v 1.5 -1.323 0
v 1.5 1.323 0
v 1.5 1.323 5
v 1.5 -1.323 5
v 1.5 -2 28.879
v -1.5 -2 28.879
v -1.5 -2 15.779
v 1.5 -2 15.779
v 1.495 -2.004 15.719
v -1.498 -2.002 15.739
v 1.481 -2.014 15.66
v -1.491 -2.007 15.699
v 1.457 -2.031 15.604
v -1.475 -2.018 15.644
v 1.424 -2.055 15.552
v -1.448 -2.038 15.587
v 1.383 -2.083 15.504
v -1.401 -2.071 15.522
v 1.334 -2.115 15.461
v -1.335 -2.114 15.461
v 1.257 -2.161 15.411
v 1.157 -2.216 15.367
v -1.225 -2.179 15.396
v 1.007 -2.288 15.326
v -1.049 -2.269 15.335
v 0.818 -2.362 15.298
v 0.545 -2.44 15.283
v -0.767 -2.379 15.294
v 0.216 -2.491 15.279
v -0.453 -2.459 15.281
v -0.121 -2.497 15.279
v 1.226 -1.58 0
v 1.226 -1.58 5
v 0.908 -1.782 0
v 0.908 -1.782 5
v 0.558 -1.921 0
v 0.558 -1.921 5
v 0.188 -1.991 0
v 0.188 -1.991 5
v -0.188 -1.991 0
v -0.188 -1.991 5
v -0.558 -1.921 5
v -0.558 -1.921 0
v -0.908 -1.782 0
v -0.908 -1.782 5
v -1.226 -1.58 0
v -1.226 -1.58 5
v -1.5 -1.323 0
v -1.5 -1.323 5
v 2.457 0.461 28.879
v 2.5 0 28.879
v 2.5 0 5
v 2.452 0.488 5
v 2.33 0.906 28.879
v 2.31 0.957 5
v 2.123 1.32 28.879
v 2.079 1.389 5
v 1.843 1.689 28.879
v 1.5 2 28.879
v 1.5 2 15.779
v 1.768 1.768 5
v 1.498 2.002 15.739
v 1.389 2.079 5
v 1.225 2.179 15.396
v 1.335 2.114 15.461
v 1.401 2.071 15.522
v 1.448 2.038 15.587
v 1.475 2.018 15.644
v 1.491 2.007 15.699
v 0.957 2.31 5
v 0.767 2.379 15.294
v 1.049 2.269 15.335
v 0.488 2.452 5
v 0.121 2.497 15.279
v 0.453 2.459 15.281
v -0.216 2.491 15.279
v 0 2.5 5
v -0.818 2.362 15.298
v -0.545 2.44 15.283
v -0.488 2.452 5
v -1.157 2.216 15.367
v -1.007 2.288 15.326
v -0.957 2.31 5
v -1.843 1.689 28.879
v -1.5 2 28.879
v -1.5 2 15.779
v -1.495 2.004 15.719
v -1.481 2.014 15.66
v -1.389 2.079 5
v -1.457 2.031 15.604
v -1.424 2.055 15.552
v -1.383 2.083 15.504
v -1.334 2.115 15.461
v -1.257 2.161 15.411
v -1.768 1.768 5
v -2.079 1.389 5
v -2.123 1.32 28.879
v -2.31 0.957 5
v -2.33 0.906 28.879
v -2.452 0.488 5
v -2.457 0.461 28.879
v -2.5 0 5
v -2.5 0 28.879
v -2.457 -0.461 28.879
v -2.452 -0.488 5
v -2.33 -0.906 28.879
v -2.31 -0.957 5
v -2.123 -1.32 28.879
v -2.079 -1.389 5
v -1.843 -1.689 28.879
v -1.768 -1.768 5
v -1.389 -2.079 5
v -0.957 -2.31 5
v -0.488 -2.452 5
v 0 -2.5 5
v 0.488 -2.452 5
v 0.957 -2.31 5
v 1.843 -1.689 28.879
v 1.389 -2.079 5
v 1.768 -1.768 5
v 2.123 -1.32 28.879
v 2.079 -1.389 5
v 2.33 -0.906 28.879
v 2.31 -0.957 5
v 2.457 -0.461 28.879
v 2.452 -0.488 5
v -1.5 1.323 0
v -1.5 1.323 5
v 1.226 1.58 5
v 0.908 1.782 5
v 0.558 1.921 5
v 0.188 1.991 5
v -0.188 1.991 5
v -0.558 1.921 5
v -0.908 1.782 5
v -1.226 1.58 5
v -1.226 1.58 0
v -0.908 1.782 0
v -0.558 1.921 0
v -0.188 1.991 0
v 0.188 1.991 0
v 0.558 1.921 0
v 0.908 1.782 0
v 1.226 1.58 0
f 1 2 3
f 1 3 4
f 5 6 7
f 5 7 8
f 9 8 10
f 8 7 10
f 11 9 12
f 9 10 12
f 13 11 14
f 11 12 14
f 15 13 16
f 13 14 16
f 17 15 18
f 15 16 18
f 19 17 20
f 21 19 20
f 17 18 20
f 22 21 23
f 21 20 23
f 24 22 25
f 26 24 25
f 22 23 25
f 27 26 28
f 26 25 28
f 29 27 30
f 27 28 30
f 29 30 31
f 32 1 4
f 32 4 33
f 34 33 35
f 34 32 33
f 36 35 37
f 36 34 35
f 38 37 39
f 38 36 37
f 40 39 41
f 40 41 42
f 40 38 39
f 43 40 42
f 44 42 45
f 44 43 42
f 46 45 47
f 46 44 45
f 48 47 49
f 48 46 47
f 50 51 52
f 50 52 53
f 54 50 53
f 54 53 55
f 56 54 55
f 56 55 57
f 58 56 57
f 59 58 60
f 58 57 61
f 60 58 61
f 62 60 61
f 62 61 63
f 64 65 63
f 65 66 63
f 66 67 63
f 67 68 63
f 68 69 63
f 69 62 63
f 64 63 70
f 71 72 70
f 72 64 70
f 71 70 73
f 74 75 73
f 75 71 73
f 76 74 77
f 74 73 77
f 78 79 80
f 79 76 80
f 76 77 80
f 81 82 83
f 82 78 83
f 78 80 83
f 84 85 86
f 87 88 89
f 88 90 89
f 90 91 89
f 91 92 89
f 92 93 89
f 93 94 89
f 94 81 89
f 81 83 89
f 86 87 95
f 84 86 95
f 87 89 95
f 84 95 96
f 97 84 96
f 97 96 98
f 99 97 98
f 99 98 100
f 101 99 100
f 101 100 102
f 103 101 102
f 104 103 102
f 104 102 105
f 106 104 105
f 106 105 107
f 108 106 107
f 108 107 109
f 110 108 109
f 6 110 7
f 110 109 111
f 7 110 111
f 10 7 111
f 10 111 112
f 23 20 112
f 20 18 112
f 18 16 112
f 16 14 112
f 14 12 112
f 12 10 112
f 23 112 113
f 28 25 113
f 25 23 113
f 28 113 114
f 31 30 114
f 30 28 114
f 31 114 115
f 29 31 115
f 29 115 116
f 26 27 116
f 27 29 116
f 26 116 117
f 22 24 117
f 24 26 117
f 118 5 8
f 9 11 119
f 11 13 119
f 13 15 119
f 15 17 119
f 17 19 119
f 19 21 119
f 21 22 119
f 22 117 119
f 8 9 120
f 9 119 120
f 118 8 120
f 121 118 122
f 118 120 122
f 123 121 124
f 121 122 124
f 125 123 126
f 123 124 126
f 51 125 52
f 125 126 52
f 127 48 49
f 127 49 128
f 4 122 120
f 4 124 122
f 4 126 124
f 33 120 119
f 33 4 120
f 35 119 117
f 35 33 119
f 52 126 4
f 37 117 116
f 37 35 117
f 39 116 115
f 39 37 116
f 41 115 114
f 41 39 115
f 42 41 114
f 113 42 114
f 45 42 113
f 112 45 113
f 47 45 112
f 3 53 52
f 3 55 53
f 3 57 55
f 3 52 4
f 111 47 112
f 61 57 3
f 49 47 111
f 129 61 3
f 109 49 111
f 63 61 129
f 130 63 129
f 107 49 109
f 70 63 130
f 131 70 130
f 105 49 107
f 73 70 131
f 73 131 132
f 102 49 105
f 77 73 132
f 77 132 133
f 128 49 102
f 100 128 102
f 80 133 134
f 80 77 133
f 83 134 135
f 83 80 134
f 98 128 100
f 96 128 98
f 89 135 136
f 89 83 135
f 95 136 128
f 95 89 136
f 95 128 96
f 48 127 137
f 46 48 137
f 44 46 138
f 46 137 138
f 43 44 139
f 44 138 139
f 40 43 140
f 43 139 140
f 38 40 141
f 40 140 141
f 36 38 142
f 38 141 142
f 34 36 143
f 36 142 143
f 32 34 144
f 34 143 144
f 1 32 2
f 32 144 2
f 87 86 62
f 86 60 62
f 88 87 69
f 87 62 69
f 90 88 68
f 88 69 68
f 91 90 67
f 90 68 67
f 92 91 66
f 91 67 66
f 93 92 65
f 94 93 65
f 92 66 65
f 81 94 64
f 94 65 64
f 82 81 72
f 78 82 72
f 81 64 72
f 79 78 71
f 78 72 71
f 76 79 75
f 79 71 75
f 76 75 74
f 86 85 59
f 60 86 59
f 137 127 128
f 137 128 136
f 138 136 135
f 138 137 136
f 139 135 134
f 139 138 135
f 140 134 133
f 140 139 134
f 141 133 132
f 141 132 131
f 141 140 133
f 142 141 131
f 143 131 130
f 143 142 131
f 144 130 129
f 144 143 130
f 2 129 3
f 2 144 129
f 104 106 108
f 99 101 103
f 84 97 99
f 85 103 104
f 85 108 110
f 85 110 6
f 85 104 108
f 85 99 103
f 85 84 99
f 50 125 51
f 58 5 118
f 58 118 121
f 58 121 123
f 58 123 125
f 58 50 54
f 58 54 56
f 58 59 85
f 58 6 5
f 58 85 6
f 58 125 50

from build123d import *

# Parameters (mm, degrees)
SKETCH1_R               = 2.5
BOSS_EXTRUDE1_DEPTH     = 28.879
SKETCH2_R               = 2.5
CUT_EXTRUDE1_DEPTH      = 5
CUT_EXTRUDE2_DEPTH      = 13.1
CUT_EXTRUDE3_DEPTH      = 3.5
CUT_EXTRUDE3_DEPTH_BACK = 3.5


with BuildPart() as part:
    # Sketch1 → Boss-Extrude1 (new body)
    with BuildSketch(Plane.XY):
        Circle(SKETCH1_R)
    extrude(amount=BOSS_EXTRUDE1_DEPTH)

    # Sketch2 → Cut-Extrude1 (cut)
    with BuildSketch(Plane(origin=(0, 0, 0), x_dir=(-1, 0, 0), z_dir=(0, 0, -1))):
        Circle(SKETCH2_R)
        with BuildLine():
            Line((-1.5, 1.322875656), (-1.5, -1.322875656))
            ThreePointArc((-1.5, -1.322875656), (0, -2), (1.5, -1.322875656))
            Line((1.5, -1.322875656), (1.5, 1.322875656))
            ThreePointArc((1.5, 1.322875656), (0, 2), (-1.5, 1.322875656))
        make_face(mode=Mode.SUBTRACT)
    extrude(amount=-CUT_EXTRUDE1_DEPTH, mode=Mode.SUBTRACT)

    # Sketch3 → Cut-Extrude2 (cut)
    with BuildSketch(Plane.XY.offset(28.879)):
        with BuildLine():
            Line((-1.5, 2), (1.5, 2))
            ThreePointArc((1.5, 2), (0, 2.5), (-1.5, 2))
        make_face()
        with BuildLine():
            Line((-1.5, -2), (1.5, -2))
            ThreePointArc((1.5, -2), (0, -2.5), (-1.5, -2))
        make_face()
    extrude(amount=-CUT_EXTRUDE2_DEPTH, mode=Mode.SUBTRACT)

    # Sketch4 → Cut-Extrude3 (cut, two sides)
    with BuildSketch(Plane(origin=(0, 0, 0), x_dir=(0, 0, -1), z_dir=(1, 0, 0))) as cut_extrude3_sk:
        with BuildLine():
            Line((-15.779, 2.5), (-15.779, 2))
            ThreePointArc((-15.779, 2), (-15.425446609, 2.146446609), (-15.279, 2.5))
            Line((-15.279, 2.5), (-15.779, 2.5))
        make_face()
        with BuildLine():
            Line((-15.779, -2.5), (-15.779, -2))
            ThreePointArc((-15.779, -2), (-15.425446609, -2.146446609), (-15.279, -2.5))
            Line((-15.279, -2.5), (-15.779, -2.5))
        make_face()
    extrude(amount=CUT_EXTRUDE3_DEPTH, mode=Mode.SUBTRACT)
    extrude(cut_extrude3_sk.sketch, amount=-CUT_EXTRUDE3_DEPTH_BACK, mode=Mode.SUBTRACT)


solid = part.part
